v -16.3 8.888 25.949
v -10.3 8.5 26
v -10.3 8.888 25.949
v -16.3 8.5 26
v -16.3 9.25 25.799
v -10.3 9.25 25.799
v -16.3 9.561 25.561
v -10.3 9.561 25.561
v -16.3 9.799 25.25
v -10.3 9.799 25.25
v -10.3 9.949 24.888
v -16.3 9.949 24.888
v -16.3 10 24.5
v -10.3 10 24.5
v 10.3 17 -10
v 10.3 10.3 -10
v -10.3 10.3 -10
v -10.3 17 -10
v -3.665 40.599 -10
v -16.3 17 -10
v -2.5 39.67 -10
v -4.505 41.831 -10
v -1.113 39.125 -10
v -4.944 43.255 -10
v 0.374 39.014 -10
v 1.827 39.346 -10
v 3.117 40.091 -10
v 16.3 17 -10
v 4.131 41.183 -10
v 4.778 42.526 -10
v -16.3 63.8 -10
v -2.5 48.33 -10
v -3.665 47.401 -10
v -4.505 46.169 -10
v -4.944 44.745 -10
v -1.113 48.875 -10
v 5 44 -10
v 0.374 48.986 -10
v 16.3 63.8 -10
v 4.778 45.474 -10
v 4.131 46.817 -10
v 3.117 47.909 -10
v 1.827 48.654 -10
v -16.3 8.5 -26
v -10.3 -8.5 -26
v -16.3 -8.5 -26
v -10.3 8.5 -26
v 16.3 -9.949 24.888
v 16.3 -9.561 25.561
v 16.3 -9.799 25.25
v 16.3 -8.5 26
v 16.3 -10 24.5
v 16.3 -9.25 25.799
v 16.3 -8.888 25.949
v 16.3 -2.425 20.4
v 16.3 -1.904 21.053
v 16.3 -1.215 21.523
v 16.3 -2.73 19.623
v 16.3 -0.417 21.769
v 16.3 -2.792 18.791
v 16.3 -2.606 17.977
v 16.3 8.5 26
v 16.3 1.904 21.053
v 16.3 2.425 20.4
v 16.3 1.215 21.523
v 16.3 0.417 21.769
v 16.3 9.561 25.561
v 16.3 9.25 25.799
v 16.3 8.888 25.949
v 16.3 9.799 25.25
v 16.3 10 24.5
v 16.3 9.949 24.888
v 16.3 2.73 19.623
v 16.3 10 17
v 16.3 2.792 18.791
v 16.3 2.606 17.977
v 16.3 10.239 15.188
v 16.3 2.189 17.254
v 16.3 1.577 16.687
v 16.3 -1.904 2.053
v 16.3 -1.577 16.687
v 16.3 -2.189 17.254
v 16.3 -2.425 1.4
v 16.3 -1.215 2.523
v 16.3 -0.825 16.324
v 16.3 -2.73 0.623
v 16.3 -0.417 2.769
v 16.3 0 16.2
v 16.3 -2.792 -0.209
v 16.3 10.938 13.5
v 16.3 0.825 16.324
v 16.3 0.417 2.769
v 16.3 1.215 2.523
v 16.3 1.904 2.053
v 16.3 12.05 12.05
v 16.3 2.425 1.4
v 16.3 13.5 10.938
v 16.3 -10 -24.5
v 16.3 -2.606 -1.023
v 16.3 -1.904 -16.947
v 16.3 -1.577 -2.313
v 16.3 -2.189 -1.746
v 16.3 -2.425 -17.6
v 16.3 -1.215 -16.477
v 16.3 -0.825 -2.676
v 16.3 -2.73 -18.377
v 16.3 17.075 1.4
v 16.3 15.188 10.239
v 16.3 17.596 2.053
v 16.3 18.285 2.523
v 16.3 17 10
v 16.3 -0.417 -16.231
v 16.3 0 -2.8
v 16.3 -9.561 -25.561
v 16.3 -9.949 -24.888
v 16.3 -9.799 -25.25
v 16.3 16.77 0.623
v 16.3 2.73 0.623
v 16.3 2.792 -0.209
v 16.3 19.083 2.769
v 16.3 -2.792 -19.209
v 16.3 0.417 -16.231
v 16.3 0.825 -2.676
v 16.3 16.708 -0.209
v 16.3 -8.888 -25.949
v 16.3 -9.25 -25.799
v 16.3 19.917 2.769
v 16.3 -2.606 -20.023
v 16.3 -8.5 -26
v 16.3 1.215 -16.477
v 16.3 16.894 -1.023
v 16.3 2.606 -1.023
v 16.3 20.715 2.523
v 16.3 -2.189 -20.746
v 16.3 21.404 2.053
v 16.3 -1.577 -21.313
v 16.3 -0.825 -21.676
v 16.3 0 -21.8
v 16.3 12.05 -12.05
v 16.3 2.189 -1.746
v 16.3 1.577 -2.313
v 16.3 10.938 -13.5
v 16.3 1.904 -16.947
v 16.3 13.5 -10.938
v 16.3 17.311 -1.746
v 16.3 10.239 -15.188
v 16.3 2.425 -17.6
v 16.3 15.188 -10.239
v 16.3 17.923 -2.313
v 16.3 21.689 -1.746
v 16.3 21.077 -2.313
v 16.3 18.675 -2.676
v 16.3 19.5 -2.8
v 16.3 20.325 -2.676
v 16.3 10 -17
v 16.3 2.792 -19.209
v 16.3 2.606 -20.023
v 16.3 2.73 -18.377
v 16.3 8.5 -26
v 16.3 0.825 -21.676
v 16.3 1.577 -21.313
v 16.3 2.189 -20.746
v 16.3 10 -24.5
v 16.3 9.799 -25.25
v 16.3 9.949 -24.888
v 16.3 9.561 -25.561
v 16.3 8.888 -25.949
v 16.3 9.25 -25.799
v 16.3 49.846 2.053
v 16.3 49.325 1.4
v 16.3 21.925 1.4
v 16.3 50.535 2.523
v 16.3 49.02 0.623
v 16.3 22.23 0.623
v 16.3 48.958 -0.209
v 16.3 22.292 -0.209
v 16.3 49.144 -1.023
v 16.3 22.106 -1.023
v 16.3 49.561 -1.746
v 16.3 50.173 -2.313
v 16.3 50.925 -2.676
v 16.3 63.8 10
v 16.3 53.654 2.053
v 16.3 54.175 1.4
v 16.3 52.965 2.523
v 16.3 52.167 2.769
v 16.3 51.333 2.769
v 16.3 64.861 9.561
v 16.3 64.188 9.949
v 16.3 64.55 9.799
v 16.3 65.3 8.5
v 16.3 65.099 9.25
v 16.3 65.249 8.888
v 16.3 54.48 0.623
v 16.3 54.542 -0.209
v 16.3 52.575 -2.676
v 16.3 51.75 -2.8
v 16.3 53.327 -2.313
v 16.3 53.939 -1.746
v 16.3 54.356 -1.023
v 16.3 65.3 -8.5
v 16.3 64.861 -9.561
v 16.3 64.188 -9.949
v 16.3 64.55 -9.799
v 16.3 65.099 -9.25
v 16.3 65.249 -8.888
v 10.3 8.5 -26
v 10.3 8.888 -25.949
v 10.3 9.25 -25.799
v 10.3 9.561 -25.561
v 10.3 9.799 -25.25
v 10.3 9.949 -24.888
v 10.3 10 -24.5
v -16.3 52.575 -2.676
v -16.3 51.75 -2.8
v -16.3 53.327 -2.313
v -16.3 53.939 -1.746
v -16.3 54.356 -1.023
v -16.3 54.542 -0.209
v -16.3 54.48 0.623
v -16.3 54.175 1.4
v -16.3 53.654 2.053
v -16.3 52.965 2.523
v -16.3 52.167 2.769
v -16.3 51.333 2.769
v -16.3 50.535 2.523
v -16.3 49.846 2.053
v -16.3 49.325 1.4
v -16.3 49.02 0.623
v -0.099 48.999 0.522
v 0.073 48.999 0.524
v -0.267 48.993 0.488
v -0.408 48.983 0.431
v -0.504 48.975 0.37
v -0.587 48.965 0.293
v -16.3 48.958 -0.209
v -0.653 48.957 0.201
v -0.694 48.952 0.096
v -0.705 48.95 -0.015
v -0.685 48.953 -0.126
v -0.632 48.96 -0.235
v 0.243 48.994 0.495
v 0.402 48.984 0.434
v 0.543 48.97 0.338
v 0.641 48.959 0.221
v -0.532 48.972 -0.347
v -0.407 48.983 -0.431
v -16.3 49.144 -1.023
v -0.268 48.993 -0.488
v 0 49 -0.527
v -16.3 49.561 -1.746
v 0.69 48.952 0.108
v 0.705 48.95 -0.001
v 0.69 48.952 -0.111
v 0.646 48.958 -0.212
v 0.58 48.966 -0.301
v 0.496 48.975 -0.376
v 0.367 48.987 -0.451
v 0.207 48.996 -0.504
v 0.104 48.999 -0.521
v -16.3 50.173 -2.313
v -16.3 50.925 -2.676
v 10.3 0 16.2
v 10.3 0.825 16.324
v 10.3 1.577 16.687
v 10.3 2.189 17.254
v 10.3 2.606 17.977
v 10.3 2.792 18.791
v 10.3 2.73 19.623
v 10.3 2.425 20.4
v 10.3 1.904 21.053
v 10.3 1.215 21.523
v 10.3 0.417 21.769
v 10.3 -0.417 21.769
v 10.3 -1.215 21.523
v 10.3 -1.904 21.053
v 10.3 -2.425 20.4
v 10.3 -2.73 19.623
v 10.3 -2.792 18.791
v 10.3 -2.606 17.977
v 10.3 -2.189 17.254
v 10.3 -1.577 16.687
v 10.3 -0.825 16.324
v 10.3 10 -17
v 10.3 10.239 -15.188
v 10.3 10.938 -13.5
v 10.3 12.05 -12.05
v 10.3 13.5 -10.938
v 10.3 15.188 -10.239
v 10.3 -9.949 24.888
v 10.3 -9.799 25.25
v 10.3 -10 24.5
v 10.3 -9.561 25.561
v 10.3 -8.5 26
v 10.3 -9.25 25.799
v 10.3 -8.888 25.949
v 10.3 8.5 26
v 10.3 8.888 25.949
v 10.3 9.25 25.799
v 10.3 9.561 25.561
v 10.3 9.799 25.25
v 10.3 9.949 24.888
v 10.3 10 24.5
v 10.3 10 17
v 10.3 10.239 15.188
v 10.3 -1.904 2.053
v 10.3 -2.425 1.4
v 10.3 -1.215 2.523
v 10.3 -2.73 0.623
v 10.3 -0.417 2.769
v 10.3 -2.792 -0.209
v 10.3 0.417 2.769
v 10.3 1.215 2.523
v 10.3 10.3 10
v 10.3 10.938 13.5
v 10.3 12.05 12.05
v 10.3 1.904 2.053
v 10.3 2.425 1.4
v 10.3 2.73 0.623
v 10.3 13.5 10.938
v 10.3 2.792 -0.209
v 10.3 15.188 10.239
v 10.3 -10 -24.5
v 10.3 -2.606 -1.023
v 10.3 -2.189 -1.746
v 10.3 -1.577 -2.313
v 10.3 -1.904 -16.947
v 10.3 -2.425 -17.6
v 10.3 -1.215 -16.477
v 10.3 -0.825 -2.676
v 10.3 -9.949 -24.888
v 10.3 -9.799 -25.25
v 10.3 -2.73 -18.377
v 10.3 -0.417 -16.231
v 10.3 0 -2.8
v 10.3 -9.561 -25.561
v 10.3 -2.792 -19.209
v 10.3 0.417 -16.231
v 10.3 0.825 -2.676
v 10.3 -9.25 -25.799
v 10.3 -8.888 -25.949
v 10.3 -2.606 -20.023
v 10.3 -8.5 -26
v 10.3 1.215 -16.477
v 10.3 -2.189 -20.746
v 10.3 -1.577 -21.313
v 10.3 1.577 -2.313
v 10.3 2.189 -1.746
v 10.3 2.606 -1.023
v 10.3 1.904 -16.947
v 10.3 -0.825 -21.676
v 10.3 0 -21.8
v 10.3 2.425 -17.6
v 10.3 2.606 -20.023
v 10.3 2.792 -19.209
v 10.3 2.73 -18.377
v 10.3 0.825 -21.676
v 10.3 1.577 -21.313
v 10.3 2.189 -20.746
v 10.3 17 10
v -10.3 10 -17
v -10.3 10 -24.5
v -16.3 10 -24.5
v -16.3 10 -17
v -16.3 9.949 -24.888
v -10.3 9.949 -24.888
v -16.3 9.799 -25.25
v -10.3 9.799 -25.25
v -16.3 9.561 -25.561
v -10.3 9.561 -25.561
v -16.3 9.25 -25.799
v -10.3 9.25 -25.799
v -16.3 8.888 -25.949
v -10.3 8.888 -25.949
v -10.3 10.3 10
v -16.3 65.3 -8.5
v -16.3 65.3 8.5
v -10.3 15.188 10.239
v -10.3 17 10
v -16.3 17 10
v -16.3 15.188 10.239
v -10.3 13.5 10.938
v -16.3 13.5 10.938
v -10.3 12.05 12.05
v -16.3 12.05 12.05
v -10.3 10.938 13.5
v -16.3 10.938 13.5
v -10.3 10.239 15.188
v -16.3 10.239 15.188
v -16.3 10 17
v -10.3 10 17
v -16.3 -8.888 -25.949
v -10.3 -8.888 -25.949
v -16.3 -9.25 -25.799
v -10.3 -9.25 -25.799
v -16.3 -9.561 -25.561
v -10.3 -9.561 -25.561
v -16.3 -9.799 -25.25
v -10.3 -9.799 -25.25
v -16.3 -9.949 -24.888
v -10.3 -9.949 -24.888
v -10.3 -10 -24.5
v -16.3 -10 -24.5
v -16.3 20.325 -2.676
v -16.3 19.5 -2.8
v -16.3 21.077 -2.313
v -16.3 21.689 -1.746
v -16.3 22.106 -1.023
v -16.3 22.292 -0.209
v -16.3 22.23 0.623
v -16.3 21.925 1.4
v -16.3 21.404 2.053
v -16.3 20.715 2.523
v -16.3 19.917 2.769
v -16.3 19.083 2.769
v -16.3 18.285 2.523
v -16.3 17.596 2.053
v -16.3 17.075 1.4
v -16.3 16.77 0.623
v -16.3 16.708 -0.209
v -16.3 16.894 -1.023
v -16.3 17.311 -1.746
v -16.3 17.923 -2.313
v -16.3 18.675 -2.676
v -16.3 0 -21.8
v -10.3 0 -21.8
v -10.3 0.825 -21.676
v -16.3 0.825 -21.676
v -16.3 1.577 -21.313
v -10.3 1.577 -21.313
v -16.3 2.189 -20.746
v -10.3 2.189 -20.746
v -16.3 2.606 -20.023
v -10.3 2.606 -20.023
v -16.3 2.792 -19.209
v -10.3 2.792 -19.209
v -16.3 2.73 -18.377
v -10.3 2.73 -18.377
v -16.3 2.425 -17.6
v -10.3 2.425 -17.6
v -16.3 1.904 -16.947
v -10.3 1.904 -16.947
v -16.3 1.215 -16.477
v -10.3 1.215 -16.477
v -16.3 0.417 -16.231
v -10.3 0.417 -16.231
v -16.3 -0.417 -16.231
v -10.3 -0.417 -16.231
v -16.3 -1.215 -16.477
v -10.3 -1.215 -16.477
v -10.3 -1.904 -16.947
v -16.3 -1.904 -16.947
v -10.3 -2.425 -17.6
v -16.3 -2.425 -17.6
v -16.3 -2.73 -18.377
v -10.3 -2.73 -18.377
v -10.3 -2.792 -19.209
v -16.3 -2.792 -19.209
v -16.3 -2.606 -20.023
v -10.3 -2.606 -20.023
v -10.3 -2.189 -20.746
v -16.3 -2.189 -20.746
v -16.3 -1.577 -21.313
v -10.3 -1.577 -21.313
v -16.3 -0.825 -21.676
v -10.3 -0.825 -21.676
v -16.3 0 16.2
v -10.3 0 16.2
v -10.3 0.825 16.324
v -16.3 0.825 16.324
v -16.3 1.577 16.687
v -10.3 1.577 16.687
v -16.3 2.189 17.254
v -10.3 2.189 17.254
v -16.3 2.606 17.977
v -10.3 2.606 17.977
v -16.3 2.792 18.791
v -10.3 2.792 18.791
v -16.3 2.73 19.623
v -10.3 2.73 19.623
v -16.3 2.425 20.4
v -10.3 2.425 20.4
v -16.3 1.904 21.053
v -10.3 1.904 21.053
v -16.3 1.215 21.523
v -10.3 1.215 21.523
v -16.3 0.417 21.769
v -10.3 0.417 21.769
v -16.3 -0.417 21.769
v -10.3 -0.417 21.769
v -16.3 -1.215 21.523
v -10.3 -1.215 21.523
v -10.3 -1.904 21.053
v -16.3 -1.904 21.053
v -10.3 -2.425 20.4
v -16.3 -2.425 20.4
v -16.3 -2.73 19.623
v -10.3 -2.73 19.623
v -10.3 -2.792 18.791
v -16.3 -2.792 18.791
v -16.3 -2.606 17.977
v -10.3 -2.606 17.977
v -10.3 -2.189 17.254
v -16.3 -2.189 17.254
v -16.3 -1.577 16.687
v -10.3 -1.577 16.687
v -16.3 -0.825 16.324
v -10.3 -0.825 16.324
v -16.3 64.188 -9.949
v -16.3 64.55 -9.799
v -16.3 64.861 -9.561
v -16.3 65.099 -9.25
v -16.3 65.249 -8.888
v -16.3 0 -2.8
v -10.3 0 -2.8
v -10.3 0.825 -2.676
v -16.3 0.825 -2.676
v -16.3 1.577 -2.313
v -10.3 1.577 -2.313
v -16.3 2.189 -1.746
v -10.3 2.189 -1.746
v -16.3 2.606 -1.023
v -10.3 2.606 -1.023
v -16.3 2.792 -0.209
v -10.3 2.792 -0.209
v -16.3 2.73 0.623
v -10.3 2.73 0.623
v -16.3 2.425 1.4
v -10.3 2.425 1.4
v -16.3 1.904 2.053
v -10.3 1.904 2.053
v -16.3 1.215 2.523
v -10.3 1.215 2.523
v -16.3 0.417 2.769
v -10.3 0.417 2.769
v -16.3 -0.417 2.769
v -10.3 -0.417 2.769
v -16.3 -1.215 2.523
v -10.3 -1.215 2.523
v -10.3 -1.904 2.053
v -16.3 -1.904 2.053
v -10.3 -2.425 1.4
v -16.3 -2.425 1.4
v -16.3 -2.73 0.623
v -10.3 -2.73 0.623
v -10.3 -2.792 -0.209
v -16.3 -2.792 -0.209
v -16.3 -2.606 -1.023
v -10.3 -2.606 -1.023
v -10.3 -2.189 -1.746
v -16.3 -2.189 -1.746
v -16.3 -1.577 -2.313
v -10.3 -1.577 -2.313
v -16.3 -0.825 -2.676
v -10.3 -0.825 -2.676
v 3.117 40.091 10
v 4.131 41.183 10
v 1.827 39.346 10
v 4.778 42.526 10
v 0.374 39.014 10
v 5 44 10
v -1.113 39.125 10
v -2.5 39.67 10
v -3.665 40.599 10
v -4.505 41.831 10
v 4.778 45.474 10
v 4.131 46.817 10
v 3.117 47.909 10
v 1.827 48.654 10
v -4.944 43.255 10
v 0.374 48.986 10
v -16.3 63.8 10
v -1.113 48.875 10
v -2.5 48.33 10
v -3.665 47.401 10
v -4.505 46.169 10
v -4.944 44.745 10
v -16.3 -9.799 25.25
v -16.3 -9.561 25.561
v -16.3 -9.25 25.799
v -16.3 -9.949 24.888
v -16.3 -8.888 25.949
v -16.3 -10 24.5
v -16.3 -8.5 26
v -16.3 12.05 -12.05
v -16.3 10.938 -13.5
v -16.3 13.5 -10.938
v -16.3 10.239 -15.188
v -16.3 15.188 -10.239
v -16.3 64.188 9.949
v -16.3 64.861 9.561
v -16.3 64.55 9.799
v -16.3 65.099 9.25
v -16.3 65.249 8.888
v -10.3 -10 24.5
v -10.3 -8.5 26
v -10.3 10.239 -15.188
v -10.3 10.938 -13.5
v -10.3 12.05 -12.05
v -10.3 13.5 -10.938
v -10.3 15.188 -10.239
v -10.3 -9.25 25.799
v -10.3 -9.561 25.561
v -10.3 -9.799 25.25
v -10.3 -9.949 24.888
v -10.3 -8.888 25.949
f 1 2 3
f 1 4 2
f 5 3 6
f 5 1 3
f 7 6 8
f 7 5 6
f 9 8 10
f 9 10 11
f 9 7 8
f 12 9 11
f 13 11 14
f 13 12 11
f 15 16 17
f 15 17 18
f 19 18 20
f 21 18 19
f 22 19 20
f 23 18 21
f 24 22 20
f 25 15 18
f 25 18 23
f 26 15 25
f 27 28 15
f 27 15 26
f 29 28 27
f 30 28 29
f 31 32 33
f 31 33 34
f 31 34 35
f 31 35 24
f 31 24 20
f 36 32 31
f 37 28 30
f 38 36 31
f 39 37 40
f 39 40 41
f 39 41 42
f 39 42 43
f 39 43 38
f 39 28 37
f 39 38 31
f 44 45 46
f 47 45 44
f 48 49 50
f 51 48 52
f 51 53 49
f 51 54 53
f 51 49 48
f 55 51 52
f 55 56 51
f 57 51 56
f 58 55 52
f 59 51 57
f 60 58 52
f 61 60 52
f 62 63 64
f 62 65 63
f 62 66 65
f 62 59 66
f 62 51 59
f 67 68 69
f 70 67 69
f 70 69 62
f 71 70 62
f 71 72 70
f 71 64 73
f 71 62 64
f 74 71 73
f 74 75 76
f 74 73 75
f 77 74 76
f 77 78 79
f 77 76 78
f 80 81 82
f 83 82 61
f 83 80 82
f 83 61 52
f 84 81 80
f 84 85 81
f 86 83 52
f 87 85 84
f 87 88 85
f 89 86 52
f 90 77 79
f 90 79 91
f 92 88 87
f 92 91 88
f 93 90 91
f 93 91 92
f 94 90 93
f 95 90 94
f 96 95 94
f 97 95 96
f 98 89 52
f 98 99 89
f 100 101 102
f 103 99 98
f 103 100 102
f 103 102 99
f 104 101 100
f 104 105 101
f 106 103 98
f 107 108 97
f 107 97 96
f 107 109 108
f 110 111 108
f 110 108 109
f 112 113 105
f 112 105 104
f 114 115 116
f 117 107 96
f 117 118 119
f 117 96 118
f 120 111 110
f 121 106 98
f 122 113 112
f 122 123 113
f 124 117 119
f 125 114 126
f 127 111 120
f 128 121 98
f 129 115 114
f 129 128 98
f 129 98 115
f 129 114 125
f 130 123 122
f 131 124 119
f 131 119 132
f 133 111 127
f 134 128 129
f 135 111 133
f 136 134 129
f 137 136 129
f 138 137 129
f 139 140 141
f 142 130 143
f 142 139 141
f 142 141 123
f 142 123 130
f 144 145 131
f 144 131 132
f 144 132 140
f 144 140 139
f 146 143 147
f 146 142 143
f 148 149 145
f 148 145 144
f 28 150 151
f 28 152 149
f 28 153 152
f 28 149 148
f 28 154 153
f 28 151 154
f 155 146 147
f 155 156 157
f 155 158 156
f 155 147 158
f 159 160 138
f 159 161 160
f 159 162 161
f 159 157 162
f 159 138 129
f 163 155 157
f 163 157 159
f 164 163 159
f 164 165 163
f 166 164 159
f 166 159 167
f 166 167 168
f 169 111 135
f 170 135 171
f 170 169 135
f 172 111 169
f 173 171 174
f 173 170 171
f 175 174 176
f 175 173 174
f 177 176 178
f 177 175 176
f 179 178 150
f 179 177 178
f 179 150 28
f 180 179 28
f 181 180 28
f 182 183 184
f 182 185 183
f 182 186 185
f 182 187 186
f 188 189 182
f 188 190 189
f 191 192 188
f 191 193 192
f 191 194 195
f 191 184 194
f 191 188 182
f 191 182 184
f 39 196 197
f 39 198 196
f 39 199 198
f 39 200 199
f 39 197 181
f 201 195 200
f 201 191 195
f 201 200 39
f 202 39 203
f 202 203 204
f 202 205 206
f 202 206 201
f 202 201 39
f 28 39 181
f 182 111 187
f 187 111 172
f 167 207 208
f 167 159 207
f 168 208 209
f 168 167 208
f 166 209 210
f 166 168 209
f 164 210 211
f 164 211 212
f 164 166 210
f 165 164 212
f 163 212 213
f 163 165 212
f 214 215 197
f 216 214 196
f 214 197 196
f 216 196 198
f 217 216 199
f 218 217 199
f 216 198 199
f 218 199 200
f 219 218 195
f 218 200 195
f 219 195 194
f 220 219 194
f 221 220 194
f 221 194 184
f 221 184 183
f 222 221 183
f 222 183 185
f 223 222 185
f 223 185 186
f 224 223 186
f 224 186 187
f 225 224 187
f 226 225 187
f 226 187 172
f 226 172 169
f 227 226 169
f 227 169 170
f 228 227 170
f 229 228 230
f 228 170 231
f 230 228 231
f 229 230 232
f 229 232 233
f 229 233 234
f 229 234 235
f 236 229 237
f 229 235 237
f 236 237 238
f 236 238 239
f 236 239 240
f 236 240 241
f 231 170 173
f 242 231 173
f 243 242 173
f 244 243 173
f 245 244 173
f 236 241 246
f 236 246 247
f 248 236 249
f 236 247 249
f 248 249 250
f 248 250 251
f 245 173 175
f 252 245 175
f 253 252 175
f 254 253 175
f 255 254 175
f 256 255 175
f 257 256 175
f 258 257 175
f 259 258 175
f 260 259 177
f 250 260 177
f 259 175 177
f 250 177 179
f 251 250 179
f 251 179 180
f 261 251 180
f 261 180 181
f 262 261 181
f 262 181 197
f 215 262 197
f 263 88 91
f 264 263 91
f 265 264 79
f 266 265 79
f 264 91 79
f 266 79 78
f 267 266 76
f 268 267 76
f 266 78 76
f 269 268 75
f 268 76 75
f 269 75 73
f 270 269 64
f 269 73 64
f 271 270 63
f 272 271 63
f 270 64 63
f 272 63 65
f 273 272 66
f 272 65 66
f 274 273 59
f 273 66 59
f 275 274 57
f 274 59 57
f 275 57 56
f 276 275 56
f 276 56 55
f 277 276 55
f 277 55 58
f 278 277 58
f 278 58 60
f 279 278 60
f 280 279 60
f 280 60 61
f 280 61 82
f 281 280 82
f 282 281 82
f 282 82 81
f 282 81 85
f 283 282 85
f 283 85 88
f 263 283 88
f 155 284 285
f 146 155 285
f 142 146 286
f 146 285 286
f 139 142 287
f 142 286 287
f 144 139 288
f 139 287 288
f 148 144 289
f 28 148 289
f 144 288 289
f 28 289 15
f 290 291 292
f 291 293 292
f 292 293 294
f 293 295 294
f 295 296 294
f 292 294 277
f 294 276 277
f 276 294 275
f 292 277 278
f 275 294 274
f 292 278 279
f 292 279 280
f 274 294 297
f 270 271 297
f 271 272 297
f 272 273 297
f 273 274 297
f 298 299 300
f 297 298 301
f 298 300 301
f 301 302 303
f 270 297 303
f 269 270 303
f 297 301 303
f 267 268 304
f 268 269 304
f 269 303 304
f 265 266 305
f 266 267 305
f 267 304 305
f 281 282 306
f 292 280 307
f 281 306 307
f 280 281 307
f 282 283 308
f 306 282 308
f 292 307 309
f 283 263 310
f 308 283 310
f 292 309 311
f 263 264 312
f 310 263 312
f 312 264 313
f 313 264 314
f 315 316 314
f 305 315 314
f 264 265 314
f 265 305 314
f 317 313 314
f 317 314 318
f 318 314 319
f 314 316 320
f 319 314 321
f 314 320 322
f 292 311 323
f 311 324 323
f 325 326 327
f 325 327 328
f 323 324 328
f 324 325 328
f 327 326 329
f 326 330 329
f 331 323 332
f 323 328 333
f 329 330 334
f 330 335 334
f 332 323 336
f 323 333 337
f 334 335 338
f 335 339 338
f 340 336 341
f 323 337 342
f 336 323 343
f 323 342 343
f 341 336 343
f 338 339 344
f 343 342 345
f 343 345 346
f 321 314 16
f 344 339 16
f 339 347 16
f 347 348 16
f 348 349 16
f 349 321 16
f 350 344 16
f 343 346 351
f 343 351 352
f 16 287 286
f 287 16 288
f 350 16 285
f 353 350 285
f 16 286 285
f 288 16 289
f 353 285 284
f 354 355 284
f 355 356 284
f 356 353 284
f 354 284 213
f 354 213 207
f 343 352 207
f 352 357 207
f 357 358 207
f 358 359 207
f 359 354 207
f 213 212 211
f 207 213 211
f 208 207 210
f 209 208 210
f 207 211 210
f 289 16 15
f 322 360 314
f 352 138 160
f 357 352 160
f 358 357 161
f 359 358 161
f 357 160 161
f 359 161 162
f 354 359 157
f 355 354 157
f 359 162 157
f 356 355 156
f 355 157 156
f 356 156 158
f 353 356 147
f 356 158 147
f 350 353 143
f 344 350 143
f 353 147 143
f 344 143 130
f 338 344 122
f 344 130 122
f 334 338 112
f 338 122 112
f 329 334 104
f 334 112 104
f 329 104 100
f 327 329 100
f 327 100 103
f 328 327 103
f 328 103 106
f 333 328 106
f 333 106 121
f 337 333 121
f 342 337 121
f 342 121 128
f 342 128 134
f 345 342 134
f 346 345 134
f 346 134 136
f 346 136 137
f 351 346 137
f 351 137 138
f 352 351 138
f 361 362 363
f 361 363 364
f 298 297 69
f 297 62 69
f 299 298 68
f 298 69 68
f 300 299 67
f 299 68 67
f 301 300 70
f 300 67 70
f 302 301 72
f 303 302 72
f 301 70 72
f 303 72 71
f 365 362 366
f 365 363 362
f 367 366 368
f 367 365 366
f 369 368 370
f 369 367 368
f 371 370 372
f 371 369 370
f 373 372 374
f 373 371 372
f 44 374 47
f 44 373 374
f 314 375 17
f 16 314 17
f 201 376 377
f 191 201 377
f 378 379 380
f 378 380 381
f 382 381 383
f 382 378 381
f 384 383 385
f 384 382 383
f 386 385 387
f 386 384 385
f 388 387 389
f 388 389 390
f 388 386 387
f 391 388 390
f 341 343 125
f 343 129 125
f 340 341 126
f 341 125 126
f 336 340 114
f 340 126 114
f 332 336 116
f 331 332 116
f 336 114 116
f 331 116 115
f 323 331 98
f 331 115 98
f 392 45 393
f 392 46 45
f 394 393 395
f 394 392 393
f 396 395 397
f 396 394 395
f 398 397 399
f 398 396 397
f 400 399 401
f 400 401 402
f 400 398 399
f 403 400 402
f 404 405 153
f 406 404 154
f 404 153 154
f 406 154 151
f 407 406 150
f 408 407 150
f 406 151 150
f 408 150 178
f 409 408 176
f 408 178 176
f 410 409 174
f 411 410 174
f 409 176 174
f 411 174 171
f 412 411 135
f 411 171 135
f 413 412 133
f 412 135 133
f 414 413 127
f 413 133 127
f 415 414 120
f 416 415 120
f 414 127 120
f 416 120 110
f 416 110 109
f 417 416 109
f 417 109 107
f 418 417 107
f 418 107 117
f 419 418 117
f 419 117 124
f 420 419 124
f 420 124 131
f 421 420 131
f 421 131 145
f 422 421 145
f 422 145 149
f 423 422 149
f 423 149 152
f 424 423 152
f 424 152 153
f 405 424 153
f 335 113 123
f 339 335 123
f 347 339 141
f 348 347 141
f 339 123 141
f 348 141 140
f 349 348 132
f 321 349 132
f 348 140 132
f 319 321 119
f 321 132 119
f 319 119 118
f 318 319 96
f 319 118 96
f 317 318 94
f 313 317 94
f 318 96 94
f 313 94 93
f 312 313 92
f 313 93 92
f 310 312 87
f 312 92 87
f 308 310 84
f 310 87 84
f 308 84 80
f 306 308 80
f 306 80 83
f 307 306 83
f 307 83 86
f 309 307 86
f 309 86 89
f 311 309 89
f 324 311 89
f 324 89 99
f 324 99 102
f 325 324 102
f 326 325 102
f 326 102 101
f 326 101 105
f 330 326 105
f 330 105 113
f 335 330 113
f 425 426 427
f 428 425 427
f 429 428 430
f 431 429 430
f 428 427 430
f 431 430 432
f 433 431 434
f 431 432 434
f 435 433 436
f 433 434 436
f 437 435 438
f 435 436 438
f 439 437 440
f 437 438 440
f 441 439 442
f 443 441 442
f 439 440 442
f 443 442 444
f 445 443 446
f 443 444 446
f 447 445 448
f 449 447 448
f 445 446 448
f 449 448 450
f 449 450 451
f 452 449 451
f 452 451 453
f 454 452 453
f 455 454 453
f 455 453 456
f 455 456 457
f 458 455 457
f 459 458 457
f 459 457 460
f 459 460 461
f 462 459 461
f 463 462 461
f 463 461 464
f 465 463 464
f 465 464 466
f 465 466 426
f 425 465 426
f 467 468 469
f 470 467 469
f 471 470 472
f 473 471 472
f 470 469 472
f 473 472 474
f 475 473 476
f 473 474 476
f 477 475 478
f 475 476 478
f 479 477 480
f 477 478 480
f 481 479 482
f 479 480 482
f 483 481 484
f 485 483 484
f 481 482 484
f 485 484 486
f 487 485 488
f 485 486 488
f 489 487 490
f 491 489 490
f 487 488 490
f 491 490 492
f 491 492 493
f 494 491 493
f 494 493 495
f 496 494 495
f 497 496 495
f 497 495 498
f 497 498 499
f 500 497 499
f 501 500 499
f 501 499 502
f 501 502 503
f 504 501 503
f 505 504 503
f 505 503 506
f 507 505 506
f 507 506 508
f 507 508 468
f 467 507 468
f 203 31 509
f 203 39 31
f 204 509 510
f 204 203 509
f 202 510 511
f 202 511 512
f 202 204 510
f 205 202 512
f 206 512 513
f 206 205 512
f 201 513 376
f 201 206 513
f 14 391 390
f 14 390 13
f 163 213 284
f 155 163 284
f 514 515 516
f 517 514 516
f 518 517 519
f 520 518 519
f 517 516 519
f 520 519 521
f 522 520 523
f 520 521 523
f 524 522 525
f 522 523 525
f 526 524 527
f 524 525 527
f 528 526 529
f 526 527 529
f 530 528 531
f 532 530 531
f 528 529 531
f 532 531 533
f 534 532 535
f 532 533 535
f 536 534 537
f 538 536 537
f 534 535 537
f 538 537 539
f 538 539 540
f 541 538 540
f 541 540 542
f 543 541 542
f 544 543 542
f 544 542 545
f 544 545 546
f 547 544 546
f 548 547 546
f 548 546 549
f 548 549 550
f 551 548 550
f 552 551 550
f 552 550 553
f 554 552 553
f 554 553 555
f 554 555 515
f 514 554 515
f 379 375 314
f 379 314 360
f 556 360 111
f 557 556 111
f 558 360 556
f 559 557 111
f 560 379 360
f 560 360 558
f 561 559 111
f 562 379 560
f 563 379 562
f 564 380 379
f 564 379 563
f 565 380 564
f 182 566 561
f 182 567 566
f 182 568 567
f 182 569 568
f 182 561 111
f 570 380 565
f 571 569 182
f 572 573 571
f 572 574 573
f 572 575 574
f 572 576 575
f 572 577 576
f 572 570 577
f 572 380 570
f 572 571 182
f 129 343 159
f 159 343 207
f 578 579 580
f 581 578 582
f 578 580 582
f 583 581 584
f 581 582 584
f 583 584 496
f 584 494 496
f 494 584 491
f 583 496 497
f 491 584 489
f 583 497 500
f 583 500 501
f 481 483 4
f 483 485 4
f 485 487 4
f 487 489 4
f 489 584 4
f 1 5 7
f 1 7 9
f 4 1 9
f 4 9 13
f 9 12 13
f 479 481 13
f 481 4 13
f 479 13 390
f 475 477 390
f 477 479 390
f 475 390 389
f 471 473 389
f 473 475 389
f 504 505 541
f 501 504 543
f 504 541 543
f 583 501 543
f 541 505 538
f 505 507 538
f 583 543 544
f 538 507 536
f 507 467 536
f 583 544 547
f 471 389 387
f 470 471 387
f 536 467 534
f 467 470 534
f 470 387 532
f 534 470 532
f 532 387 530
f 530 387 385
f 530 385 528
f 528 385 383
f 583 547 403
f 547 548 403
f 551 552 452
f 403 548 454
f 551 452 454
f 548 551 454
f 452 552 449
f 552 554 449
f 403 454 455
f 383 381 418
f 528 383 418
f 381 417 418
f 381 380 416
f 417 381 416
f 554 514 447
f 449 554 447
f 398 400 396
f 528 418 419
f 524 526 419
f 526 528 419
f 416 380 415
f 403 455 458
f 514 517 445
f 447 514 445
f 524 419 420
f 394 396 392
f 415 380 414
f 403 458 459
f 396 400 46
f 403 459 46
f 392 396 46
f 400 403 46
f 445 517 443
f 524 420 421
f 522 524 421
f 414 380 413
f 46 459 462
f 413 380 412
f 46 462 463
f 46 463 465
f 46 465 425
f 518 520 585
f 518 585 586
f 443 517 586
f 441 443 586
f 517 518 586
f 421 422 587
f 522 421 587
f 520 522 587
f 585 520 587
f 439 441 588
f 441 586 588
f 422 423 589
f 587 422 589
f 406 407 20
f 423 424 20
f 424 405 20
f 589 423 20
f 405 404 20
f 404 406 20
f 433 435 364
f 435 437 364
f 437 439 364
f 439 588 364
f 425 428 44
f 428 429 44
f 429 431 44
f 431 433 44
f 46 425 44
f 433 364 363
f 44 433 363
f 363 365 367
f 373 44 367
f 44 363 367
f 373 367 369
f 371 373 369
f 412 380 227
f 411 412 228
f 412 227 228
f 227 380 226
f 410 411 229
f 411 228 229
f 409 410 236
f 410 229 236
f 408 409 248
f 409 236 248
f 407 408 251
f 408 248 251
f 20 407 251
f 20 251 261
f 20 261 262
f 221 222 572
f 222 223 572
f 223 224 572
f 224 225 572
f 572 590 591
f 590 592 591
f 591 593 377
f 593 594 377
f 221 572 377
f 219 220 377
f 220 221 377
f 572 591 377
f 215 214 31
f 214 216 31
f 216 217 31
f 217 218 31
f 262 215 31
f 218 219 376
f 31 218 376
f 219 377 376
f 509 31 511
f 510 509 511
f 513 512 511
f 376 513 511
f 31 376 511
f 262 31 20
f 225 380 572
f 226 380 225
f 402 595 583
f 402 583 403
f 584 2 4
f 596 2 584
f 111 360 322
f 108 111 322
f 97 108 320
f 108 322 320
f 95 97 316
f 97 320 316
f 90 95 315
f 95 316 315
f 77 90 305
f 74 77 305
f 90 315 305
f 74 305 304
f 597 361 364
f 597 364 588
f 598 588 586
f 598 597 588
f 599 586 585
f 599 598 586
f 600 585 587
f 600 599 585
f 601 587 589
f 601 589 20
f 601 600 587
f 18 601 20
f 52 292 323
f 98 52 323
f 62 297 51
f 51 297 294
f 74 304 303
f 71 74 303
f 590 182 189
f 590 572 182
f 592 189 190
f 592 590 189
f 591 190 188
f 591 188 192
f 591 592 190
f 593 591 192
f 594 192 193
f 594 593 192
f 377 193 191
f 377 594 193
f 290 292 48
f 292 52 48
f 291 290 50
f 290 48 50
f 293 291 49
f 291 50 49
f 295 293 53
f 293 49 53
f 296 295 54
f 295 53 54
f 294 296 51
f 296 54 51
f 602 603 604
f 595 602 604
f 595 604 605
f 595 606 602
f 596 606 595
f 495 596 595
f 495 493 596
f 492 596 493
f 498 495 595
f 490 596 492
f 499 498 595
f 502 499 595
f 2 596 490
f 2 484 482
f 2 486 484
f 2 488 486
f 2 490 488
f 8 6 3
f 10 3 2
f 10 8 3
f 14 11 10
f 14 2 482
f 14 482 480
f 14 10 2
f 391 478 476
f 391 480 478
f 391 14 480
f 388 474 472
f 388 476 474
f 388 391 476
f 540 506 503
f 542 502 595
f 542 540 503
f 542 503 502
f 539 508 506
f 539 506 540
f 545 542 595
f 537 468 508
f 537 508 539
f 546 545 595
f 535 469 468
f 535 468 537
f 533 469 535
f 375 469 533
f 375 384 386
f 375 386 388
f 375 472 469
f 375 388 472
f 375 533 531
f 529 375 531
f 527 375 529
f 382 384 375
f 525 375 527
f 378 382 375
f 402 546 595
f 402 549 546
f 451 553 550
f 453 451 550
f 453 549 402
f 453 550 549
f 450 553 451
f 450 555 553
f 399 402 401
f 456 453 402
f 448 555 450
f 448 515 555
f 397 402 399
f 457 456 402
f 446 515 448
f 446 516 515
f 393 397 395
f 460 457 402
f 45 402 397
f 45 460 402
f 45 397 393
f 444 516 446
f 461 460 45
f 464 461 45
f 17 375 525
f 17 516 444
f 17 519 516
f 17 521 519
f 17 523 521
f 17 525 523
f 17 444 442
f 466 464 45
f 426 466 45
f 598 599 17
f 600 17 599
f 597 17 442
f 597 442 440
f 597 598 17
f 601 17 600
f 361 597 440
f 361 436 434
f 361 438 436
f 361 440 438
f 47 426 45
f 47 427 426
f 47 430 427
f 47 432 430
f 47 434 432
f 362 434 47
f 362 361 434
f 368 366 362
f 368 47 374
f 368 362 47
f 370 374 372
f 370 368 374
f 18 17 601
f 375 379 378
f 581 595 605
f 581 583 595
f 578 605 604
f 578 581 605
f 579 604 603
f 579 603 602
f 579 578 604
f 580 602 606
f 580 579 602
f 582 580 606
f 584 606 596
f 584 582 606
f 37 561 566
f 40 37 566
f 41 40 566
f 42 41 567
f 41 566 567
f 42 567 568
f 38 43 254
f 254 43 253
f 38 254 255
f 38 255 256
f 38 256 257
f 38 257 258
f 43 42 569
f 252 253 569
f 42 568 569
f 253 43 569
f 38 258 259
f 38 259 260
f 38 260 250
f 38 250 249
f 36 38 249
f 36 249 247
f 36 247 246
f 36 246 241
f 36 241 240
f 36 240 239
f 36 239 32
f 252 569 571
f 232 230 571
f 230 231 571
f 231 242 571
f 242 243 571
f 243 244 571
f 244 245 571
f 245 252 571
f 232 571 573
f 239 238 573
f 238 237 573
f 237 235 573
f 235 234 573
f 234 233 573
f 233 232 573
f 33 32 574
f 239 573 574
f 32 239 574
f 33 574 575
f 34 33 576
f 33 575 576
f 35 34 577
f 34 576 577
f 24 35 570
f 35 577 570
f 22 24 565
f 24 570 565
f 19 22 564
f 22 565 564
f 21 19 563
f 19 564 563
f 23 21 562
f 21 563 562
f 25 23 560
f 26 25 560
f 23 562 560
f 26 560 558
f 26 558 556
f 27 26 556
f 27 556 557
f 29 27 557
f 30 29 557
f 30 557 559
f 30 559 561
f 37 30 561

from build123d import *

# Parameters (mm, degrees)
EXTRUDE1_DEPTH      = 10.3
EXTRUDE1_DEPTH_BACK = 10.3
SKETCH1_W           = 20
SKETCH1_H           = 55
EXTRUDE2_DEPTH      = 6
SKETCH4_R           = 2.8
EXTRUDE3_DEPTH      = 78.478061411
SKETCH5_R           = 5
EXTRUDE4_DEPTH      = 77.326797391
FILLET2_R           = 1.5


with BuildPart() as part:
    # Sketch1 → Extrude1 (new, two sides: drawn at the far end of the back side and taken through both)
    with BuildSketch(Plane(origin=(0, 0, 0), x_dir=(0, 0, -1), z_dir=(1, 0, 0)).offset(-EXTRUDE1_DEPTH_BACK)):
        with Locations((0, 37.8)):
            Rectangle(SKETCH1_W, SKETCH1_H)
    extrude(amount=EXTRUDE1_DEPTH + EXTRUDE1_DEPTH_BACK)

    # Sketch2 → Extrude2 (add)
    with BuildSketch(Plane(origin=(10.3, 0, 0), x_dir=(0, 0, -1), z_dir=(1, 0, 0))):
        with BuildLine():
            Line((26, 10), (17, 10))
            ThreePointArc((17, 10), (12.050252532, 12.050252532), (10, 17))
            Line((10, 17), (10, 65.3))
            Line((10, 65.3), (-10, 65.3))
            Line((-10, 65.3), (-10, 17))
            ThreePointArc((-10, 17), (-12.050252532, 12.050252532), (-17, 10))
            Line((-17, 10), (-26, 10))
            Line((-26, 10), (-26, -10))
            Line((-26, -10), (26, -10))
            Line((26, -10), (26, 10))
        make_face()
    extrude2 = extrude(amount=EXTRUDE2_DEPTH)

    # Mirror2: Extrude2 across plane
    add(extrude2.mirror(Plane(origin=(0, 0, 0), x_dir=(0, 0, 1), z_dir=(1, 0, 0))))

    # Sketch4 → Extrude3 (cut, through all)
    with BuildSketch(Plane(origin=(16.3, 0, 0), x_dir=(0, 0, -1), z_dir=(1, 0, 0))):
        Circle(SKETCH4_R)
        with Locations((19, 0)):
            Circle(SKETCH4_R)
        with Locations((-19, 0)):
            Circle(SKETCH4_R)
        with Locations((0, 19.5)):
            Circle(SKETCH4_R)
        with Locations((0, 51.75)):
            Circle(SKETCH4_R)
    extrude(amount=-EXTRUDE3_DEPTH, mode=Mode.SUBTRACT)

    # Sketch5 → Extrude4 (cut, through all)
    with BuildSketch(Plane.XY.offset(10)):
        with Locations((0, 44)):
            Circle(SKETCH5_R)
    extrude(amount=-EXTRUDE4_DEPTH, mode=Mode.SUBTRACT)

    # Fillet2
    fillet2_edges = [part.edges().sort_by_distance(p)[0] for p in [
        (13.3, 10, 26),
        (13.3, -10, 26),
        (13.3, -10, -26),
        (13.3, 10, -26),
        (-13.3, -10, 26),
        (-13.3, 10, 26),
        (-13.3, 10, -26),
        (-13.3, -10, -26),
        (0, 65.3, 10),
        (0, 65.3, -10),
    ]]
    fillet(fillet2_edges, radius=FILLET2_R)


solid = part.part
